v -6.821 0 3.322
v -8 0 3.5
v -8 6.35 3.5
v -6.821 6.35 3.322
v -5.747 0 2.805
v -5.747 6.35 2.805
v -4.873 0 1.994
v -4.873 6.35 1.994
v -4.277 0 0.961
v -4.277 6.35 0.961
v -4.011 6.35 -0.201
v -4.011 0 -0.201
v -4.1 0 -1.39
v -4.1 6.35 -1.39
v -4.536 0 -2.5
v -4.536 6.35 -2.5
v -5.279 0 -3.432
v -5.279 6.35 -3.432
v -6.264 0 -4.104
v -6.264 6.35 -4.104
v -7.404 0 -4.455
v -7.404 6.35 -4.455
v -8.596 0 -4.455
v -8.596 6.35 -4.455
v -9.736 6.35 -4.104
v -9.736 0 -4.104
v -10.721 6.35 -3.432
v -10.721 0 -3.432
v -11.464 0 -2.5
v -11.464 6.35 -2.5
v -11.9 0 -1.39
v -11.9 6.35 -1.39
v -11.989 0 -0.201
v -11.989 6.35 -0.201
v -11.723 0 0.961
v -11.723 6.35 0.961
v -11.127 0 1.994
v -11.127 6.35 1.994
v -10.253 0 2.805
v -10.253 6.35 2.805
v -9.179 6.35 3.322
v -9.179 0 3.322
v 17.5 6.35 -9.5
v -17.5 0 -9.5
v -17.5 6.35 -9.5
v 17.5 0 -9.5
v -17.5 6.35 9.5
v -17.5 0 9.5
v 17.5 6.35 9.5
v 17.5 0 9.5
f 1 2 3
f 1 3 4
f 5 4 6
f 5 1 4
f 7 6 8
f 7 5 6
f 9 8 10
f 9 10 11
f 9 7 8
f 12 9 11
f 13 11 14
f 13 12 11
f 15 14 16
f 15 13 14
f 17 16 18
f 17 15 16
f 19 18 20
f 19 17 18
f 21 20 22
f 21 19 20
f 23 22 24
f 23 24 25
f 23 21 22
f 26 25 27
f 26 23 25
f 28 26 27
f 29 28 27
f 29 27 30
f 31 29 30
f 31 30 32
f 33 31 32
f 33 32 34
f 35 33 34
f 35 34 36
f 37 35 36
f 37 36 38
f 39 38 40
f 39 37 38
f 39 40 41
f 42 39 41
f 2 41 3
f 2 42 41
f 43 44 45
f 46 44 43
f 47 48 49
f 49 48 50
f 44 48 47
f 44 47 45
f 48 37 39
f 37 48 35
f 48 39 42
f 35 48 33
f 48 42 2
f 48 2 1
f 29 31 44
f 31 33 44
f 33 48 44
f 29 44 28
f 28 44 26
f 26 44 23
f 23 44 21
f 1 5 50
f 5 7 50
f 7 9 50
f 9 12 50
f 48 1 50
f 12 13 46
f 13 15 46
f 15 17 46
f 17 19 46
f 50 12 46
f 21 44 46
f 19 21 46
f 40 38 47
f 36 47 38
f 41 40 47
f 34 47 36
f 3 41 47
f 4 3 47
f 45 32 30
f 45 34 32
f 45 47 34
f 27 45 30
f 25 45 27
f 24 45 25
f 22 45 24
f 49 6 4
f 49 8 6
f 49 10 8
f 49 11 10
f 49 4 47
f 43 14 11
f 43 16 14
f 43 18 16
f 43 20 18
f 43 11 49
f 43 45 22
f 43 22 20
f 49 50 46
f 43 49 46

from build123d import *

# Parameters (mm, degrees)
SCHIZZO1_W                   = 35
SCHIZZO1_H                   = 19
SCHIZZO1_R                   = 4
ESTRUSIONE_ESTRUSIONE1_DEPTH = 6.35


with BuildPart() as part:
    # Schizzo1 → Estrusione-Estrusione1 (new body)
    with BuildSketch(Plane(origin=(0, 0, 0), x_dir=(1, 0, 0), z_dir=(0, 1, 0))):
        Rectangle(SCHIZZO1_W, SCHIZZO1_H)
        with Locations(Location((-8, 0.5, 0), (0, 0, 270))):
            Circle(SCHIZZO1_R, mode=Mode.SUBTRACT)
    extrude(amount=ESTRUSIONE_ESTRUSIONE1_DEPTH)


solid = part.part
